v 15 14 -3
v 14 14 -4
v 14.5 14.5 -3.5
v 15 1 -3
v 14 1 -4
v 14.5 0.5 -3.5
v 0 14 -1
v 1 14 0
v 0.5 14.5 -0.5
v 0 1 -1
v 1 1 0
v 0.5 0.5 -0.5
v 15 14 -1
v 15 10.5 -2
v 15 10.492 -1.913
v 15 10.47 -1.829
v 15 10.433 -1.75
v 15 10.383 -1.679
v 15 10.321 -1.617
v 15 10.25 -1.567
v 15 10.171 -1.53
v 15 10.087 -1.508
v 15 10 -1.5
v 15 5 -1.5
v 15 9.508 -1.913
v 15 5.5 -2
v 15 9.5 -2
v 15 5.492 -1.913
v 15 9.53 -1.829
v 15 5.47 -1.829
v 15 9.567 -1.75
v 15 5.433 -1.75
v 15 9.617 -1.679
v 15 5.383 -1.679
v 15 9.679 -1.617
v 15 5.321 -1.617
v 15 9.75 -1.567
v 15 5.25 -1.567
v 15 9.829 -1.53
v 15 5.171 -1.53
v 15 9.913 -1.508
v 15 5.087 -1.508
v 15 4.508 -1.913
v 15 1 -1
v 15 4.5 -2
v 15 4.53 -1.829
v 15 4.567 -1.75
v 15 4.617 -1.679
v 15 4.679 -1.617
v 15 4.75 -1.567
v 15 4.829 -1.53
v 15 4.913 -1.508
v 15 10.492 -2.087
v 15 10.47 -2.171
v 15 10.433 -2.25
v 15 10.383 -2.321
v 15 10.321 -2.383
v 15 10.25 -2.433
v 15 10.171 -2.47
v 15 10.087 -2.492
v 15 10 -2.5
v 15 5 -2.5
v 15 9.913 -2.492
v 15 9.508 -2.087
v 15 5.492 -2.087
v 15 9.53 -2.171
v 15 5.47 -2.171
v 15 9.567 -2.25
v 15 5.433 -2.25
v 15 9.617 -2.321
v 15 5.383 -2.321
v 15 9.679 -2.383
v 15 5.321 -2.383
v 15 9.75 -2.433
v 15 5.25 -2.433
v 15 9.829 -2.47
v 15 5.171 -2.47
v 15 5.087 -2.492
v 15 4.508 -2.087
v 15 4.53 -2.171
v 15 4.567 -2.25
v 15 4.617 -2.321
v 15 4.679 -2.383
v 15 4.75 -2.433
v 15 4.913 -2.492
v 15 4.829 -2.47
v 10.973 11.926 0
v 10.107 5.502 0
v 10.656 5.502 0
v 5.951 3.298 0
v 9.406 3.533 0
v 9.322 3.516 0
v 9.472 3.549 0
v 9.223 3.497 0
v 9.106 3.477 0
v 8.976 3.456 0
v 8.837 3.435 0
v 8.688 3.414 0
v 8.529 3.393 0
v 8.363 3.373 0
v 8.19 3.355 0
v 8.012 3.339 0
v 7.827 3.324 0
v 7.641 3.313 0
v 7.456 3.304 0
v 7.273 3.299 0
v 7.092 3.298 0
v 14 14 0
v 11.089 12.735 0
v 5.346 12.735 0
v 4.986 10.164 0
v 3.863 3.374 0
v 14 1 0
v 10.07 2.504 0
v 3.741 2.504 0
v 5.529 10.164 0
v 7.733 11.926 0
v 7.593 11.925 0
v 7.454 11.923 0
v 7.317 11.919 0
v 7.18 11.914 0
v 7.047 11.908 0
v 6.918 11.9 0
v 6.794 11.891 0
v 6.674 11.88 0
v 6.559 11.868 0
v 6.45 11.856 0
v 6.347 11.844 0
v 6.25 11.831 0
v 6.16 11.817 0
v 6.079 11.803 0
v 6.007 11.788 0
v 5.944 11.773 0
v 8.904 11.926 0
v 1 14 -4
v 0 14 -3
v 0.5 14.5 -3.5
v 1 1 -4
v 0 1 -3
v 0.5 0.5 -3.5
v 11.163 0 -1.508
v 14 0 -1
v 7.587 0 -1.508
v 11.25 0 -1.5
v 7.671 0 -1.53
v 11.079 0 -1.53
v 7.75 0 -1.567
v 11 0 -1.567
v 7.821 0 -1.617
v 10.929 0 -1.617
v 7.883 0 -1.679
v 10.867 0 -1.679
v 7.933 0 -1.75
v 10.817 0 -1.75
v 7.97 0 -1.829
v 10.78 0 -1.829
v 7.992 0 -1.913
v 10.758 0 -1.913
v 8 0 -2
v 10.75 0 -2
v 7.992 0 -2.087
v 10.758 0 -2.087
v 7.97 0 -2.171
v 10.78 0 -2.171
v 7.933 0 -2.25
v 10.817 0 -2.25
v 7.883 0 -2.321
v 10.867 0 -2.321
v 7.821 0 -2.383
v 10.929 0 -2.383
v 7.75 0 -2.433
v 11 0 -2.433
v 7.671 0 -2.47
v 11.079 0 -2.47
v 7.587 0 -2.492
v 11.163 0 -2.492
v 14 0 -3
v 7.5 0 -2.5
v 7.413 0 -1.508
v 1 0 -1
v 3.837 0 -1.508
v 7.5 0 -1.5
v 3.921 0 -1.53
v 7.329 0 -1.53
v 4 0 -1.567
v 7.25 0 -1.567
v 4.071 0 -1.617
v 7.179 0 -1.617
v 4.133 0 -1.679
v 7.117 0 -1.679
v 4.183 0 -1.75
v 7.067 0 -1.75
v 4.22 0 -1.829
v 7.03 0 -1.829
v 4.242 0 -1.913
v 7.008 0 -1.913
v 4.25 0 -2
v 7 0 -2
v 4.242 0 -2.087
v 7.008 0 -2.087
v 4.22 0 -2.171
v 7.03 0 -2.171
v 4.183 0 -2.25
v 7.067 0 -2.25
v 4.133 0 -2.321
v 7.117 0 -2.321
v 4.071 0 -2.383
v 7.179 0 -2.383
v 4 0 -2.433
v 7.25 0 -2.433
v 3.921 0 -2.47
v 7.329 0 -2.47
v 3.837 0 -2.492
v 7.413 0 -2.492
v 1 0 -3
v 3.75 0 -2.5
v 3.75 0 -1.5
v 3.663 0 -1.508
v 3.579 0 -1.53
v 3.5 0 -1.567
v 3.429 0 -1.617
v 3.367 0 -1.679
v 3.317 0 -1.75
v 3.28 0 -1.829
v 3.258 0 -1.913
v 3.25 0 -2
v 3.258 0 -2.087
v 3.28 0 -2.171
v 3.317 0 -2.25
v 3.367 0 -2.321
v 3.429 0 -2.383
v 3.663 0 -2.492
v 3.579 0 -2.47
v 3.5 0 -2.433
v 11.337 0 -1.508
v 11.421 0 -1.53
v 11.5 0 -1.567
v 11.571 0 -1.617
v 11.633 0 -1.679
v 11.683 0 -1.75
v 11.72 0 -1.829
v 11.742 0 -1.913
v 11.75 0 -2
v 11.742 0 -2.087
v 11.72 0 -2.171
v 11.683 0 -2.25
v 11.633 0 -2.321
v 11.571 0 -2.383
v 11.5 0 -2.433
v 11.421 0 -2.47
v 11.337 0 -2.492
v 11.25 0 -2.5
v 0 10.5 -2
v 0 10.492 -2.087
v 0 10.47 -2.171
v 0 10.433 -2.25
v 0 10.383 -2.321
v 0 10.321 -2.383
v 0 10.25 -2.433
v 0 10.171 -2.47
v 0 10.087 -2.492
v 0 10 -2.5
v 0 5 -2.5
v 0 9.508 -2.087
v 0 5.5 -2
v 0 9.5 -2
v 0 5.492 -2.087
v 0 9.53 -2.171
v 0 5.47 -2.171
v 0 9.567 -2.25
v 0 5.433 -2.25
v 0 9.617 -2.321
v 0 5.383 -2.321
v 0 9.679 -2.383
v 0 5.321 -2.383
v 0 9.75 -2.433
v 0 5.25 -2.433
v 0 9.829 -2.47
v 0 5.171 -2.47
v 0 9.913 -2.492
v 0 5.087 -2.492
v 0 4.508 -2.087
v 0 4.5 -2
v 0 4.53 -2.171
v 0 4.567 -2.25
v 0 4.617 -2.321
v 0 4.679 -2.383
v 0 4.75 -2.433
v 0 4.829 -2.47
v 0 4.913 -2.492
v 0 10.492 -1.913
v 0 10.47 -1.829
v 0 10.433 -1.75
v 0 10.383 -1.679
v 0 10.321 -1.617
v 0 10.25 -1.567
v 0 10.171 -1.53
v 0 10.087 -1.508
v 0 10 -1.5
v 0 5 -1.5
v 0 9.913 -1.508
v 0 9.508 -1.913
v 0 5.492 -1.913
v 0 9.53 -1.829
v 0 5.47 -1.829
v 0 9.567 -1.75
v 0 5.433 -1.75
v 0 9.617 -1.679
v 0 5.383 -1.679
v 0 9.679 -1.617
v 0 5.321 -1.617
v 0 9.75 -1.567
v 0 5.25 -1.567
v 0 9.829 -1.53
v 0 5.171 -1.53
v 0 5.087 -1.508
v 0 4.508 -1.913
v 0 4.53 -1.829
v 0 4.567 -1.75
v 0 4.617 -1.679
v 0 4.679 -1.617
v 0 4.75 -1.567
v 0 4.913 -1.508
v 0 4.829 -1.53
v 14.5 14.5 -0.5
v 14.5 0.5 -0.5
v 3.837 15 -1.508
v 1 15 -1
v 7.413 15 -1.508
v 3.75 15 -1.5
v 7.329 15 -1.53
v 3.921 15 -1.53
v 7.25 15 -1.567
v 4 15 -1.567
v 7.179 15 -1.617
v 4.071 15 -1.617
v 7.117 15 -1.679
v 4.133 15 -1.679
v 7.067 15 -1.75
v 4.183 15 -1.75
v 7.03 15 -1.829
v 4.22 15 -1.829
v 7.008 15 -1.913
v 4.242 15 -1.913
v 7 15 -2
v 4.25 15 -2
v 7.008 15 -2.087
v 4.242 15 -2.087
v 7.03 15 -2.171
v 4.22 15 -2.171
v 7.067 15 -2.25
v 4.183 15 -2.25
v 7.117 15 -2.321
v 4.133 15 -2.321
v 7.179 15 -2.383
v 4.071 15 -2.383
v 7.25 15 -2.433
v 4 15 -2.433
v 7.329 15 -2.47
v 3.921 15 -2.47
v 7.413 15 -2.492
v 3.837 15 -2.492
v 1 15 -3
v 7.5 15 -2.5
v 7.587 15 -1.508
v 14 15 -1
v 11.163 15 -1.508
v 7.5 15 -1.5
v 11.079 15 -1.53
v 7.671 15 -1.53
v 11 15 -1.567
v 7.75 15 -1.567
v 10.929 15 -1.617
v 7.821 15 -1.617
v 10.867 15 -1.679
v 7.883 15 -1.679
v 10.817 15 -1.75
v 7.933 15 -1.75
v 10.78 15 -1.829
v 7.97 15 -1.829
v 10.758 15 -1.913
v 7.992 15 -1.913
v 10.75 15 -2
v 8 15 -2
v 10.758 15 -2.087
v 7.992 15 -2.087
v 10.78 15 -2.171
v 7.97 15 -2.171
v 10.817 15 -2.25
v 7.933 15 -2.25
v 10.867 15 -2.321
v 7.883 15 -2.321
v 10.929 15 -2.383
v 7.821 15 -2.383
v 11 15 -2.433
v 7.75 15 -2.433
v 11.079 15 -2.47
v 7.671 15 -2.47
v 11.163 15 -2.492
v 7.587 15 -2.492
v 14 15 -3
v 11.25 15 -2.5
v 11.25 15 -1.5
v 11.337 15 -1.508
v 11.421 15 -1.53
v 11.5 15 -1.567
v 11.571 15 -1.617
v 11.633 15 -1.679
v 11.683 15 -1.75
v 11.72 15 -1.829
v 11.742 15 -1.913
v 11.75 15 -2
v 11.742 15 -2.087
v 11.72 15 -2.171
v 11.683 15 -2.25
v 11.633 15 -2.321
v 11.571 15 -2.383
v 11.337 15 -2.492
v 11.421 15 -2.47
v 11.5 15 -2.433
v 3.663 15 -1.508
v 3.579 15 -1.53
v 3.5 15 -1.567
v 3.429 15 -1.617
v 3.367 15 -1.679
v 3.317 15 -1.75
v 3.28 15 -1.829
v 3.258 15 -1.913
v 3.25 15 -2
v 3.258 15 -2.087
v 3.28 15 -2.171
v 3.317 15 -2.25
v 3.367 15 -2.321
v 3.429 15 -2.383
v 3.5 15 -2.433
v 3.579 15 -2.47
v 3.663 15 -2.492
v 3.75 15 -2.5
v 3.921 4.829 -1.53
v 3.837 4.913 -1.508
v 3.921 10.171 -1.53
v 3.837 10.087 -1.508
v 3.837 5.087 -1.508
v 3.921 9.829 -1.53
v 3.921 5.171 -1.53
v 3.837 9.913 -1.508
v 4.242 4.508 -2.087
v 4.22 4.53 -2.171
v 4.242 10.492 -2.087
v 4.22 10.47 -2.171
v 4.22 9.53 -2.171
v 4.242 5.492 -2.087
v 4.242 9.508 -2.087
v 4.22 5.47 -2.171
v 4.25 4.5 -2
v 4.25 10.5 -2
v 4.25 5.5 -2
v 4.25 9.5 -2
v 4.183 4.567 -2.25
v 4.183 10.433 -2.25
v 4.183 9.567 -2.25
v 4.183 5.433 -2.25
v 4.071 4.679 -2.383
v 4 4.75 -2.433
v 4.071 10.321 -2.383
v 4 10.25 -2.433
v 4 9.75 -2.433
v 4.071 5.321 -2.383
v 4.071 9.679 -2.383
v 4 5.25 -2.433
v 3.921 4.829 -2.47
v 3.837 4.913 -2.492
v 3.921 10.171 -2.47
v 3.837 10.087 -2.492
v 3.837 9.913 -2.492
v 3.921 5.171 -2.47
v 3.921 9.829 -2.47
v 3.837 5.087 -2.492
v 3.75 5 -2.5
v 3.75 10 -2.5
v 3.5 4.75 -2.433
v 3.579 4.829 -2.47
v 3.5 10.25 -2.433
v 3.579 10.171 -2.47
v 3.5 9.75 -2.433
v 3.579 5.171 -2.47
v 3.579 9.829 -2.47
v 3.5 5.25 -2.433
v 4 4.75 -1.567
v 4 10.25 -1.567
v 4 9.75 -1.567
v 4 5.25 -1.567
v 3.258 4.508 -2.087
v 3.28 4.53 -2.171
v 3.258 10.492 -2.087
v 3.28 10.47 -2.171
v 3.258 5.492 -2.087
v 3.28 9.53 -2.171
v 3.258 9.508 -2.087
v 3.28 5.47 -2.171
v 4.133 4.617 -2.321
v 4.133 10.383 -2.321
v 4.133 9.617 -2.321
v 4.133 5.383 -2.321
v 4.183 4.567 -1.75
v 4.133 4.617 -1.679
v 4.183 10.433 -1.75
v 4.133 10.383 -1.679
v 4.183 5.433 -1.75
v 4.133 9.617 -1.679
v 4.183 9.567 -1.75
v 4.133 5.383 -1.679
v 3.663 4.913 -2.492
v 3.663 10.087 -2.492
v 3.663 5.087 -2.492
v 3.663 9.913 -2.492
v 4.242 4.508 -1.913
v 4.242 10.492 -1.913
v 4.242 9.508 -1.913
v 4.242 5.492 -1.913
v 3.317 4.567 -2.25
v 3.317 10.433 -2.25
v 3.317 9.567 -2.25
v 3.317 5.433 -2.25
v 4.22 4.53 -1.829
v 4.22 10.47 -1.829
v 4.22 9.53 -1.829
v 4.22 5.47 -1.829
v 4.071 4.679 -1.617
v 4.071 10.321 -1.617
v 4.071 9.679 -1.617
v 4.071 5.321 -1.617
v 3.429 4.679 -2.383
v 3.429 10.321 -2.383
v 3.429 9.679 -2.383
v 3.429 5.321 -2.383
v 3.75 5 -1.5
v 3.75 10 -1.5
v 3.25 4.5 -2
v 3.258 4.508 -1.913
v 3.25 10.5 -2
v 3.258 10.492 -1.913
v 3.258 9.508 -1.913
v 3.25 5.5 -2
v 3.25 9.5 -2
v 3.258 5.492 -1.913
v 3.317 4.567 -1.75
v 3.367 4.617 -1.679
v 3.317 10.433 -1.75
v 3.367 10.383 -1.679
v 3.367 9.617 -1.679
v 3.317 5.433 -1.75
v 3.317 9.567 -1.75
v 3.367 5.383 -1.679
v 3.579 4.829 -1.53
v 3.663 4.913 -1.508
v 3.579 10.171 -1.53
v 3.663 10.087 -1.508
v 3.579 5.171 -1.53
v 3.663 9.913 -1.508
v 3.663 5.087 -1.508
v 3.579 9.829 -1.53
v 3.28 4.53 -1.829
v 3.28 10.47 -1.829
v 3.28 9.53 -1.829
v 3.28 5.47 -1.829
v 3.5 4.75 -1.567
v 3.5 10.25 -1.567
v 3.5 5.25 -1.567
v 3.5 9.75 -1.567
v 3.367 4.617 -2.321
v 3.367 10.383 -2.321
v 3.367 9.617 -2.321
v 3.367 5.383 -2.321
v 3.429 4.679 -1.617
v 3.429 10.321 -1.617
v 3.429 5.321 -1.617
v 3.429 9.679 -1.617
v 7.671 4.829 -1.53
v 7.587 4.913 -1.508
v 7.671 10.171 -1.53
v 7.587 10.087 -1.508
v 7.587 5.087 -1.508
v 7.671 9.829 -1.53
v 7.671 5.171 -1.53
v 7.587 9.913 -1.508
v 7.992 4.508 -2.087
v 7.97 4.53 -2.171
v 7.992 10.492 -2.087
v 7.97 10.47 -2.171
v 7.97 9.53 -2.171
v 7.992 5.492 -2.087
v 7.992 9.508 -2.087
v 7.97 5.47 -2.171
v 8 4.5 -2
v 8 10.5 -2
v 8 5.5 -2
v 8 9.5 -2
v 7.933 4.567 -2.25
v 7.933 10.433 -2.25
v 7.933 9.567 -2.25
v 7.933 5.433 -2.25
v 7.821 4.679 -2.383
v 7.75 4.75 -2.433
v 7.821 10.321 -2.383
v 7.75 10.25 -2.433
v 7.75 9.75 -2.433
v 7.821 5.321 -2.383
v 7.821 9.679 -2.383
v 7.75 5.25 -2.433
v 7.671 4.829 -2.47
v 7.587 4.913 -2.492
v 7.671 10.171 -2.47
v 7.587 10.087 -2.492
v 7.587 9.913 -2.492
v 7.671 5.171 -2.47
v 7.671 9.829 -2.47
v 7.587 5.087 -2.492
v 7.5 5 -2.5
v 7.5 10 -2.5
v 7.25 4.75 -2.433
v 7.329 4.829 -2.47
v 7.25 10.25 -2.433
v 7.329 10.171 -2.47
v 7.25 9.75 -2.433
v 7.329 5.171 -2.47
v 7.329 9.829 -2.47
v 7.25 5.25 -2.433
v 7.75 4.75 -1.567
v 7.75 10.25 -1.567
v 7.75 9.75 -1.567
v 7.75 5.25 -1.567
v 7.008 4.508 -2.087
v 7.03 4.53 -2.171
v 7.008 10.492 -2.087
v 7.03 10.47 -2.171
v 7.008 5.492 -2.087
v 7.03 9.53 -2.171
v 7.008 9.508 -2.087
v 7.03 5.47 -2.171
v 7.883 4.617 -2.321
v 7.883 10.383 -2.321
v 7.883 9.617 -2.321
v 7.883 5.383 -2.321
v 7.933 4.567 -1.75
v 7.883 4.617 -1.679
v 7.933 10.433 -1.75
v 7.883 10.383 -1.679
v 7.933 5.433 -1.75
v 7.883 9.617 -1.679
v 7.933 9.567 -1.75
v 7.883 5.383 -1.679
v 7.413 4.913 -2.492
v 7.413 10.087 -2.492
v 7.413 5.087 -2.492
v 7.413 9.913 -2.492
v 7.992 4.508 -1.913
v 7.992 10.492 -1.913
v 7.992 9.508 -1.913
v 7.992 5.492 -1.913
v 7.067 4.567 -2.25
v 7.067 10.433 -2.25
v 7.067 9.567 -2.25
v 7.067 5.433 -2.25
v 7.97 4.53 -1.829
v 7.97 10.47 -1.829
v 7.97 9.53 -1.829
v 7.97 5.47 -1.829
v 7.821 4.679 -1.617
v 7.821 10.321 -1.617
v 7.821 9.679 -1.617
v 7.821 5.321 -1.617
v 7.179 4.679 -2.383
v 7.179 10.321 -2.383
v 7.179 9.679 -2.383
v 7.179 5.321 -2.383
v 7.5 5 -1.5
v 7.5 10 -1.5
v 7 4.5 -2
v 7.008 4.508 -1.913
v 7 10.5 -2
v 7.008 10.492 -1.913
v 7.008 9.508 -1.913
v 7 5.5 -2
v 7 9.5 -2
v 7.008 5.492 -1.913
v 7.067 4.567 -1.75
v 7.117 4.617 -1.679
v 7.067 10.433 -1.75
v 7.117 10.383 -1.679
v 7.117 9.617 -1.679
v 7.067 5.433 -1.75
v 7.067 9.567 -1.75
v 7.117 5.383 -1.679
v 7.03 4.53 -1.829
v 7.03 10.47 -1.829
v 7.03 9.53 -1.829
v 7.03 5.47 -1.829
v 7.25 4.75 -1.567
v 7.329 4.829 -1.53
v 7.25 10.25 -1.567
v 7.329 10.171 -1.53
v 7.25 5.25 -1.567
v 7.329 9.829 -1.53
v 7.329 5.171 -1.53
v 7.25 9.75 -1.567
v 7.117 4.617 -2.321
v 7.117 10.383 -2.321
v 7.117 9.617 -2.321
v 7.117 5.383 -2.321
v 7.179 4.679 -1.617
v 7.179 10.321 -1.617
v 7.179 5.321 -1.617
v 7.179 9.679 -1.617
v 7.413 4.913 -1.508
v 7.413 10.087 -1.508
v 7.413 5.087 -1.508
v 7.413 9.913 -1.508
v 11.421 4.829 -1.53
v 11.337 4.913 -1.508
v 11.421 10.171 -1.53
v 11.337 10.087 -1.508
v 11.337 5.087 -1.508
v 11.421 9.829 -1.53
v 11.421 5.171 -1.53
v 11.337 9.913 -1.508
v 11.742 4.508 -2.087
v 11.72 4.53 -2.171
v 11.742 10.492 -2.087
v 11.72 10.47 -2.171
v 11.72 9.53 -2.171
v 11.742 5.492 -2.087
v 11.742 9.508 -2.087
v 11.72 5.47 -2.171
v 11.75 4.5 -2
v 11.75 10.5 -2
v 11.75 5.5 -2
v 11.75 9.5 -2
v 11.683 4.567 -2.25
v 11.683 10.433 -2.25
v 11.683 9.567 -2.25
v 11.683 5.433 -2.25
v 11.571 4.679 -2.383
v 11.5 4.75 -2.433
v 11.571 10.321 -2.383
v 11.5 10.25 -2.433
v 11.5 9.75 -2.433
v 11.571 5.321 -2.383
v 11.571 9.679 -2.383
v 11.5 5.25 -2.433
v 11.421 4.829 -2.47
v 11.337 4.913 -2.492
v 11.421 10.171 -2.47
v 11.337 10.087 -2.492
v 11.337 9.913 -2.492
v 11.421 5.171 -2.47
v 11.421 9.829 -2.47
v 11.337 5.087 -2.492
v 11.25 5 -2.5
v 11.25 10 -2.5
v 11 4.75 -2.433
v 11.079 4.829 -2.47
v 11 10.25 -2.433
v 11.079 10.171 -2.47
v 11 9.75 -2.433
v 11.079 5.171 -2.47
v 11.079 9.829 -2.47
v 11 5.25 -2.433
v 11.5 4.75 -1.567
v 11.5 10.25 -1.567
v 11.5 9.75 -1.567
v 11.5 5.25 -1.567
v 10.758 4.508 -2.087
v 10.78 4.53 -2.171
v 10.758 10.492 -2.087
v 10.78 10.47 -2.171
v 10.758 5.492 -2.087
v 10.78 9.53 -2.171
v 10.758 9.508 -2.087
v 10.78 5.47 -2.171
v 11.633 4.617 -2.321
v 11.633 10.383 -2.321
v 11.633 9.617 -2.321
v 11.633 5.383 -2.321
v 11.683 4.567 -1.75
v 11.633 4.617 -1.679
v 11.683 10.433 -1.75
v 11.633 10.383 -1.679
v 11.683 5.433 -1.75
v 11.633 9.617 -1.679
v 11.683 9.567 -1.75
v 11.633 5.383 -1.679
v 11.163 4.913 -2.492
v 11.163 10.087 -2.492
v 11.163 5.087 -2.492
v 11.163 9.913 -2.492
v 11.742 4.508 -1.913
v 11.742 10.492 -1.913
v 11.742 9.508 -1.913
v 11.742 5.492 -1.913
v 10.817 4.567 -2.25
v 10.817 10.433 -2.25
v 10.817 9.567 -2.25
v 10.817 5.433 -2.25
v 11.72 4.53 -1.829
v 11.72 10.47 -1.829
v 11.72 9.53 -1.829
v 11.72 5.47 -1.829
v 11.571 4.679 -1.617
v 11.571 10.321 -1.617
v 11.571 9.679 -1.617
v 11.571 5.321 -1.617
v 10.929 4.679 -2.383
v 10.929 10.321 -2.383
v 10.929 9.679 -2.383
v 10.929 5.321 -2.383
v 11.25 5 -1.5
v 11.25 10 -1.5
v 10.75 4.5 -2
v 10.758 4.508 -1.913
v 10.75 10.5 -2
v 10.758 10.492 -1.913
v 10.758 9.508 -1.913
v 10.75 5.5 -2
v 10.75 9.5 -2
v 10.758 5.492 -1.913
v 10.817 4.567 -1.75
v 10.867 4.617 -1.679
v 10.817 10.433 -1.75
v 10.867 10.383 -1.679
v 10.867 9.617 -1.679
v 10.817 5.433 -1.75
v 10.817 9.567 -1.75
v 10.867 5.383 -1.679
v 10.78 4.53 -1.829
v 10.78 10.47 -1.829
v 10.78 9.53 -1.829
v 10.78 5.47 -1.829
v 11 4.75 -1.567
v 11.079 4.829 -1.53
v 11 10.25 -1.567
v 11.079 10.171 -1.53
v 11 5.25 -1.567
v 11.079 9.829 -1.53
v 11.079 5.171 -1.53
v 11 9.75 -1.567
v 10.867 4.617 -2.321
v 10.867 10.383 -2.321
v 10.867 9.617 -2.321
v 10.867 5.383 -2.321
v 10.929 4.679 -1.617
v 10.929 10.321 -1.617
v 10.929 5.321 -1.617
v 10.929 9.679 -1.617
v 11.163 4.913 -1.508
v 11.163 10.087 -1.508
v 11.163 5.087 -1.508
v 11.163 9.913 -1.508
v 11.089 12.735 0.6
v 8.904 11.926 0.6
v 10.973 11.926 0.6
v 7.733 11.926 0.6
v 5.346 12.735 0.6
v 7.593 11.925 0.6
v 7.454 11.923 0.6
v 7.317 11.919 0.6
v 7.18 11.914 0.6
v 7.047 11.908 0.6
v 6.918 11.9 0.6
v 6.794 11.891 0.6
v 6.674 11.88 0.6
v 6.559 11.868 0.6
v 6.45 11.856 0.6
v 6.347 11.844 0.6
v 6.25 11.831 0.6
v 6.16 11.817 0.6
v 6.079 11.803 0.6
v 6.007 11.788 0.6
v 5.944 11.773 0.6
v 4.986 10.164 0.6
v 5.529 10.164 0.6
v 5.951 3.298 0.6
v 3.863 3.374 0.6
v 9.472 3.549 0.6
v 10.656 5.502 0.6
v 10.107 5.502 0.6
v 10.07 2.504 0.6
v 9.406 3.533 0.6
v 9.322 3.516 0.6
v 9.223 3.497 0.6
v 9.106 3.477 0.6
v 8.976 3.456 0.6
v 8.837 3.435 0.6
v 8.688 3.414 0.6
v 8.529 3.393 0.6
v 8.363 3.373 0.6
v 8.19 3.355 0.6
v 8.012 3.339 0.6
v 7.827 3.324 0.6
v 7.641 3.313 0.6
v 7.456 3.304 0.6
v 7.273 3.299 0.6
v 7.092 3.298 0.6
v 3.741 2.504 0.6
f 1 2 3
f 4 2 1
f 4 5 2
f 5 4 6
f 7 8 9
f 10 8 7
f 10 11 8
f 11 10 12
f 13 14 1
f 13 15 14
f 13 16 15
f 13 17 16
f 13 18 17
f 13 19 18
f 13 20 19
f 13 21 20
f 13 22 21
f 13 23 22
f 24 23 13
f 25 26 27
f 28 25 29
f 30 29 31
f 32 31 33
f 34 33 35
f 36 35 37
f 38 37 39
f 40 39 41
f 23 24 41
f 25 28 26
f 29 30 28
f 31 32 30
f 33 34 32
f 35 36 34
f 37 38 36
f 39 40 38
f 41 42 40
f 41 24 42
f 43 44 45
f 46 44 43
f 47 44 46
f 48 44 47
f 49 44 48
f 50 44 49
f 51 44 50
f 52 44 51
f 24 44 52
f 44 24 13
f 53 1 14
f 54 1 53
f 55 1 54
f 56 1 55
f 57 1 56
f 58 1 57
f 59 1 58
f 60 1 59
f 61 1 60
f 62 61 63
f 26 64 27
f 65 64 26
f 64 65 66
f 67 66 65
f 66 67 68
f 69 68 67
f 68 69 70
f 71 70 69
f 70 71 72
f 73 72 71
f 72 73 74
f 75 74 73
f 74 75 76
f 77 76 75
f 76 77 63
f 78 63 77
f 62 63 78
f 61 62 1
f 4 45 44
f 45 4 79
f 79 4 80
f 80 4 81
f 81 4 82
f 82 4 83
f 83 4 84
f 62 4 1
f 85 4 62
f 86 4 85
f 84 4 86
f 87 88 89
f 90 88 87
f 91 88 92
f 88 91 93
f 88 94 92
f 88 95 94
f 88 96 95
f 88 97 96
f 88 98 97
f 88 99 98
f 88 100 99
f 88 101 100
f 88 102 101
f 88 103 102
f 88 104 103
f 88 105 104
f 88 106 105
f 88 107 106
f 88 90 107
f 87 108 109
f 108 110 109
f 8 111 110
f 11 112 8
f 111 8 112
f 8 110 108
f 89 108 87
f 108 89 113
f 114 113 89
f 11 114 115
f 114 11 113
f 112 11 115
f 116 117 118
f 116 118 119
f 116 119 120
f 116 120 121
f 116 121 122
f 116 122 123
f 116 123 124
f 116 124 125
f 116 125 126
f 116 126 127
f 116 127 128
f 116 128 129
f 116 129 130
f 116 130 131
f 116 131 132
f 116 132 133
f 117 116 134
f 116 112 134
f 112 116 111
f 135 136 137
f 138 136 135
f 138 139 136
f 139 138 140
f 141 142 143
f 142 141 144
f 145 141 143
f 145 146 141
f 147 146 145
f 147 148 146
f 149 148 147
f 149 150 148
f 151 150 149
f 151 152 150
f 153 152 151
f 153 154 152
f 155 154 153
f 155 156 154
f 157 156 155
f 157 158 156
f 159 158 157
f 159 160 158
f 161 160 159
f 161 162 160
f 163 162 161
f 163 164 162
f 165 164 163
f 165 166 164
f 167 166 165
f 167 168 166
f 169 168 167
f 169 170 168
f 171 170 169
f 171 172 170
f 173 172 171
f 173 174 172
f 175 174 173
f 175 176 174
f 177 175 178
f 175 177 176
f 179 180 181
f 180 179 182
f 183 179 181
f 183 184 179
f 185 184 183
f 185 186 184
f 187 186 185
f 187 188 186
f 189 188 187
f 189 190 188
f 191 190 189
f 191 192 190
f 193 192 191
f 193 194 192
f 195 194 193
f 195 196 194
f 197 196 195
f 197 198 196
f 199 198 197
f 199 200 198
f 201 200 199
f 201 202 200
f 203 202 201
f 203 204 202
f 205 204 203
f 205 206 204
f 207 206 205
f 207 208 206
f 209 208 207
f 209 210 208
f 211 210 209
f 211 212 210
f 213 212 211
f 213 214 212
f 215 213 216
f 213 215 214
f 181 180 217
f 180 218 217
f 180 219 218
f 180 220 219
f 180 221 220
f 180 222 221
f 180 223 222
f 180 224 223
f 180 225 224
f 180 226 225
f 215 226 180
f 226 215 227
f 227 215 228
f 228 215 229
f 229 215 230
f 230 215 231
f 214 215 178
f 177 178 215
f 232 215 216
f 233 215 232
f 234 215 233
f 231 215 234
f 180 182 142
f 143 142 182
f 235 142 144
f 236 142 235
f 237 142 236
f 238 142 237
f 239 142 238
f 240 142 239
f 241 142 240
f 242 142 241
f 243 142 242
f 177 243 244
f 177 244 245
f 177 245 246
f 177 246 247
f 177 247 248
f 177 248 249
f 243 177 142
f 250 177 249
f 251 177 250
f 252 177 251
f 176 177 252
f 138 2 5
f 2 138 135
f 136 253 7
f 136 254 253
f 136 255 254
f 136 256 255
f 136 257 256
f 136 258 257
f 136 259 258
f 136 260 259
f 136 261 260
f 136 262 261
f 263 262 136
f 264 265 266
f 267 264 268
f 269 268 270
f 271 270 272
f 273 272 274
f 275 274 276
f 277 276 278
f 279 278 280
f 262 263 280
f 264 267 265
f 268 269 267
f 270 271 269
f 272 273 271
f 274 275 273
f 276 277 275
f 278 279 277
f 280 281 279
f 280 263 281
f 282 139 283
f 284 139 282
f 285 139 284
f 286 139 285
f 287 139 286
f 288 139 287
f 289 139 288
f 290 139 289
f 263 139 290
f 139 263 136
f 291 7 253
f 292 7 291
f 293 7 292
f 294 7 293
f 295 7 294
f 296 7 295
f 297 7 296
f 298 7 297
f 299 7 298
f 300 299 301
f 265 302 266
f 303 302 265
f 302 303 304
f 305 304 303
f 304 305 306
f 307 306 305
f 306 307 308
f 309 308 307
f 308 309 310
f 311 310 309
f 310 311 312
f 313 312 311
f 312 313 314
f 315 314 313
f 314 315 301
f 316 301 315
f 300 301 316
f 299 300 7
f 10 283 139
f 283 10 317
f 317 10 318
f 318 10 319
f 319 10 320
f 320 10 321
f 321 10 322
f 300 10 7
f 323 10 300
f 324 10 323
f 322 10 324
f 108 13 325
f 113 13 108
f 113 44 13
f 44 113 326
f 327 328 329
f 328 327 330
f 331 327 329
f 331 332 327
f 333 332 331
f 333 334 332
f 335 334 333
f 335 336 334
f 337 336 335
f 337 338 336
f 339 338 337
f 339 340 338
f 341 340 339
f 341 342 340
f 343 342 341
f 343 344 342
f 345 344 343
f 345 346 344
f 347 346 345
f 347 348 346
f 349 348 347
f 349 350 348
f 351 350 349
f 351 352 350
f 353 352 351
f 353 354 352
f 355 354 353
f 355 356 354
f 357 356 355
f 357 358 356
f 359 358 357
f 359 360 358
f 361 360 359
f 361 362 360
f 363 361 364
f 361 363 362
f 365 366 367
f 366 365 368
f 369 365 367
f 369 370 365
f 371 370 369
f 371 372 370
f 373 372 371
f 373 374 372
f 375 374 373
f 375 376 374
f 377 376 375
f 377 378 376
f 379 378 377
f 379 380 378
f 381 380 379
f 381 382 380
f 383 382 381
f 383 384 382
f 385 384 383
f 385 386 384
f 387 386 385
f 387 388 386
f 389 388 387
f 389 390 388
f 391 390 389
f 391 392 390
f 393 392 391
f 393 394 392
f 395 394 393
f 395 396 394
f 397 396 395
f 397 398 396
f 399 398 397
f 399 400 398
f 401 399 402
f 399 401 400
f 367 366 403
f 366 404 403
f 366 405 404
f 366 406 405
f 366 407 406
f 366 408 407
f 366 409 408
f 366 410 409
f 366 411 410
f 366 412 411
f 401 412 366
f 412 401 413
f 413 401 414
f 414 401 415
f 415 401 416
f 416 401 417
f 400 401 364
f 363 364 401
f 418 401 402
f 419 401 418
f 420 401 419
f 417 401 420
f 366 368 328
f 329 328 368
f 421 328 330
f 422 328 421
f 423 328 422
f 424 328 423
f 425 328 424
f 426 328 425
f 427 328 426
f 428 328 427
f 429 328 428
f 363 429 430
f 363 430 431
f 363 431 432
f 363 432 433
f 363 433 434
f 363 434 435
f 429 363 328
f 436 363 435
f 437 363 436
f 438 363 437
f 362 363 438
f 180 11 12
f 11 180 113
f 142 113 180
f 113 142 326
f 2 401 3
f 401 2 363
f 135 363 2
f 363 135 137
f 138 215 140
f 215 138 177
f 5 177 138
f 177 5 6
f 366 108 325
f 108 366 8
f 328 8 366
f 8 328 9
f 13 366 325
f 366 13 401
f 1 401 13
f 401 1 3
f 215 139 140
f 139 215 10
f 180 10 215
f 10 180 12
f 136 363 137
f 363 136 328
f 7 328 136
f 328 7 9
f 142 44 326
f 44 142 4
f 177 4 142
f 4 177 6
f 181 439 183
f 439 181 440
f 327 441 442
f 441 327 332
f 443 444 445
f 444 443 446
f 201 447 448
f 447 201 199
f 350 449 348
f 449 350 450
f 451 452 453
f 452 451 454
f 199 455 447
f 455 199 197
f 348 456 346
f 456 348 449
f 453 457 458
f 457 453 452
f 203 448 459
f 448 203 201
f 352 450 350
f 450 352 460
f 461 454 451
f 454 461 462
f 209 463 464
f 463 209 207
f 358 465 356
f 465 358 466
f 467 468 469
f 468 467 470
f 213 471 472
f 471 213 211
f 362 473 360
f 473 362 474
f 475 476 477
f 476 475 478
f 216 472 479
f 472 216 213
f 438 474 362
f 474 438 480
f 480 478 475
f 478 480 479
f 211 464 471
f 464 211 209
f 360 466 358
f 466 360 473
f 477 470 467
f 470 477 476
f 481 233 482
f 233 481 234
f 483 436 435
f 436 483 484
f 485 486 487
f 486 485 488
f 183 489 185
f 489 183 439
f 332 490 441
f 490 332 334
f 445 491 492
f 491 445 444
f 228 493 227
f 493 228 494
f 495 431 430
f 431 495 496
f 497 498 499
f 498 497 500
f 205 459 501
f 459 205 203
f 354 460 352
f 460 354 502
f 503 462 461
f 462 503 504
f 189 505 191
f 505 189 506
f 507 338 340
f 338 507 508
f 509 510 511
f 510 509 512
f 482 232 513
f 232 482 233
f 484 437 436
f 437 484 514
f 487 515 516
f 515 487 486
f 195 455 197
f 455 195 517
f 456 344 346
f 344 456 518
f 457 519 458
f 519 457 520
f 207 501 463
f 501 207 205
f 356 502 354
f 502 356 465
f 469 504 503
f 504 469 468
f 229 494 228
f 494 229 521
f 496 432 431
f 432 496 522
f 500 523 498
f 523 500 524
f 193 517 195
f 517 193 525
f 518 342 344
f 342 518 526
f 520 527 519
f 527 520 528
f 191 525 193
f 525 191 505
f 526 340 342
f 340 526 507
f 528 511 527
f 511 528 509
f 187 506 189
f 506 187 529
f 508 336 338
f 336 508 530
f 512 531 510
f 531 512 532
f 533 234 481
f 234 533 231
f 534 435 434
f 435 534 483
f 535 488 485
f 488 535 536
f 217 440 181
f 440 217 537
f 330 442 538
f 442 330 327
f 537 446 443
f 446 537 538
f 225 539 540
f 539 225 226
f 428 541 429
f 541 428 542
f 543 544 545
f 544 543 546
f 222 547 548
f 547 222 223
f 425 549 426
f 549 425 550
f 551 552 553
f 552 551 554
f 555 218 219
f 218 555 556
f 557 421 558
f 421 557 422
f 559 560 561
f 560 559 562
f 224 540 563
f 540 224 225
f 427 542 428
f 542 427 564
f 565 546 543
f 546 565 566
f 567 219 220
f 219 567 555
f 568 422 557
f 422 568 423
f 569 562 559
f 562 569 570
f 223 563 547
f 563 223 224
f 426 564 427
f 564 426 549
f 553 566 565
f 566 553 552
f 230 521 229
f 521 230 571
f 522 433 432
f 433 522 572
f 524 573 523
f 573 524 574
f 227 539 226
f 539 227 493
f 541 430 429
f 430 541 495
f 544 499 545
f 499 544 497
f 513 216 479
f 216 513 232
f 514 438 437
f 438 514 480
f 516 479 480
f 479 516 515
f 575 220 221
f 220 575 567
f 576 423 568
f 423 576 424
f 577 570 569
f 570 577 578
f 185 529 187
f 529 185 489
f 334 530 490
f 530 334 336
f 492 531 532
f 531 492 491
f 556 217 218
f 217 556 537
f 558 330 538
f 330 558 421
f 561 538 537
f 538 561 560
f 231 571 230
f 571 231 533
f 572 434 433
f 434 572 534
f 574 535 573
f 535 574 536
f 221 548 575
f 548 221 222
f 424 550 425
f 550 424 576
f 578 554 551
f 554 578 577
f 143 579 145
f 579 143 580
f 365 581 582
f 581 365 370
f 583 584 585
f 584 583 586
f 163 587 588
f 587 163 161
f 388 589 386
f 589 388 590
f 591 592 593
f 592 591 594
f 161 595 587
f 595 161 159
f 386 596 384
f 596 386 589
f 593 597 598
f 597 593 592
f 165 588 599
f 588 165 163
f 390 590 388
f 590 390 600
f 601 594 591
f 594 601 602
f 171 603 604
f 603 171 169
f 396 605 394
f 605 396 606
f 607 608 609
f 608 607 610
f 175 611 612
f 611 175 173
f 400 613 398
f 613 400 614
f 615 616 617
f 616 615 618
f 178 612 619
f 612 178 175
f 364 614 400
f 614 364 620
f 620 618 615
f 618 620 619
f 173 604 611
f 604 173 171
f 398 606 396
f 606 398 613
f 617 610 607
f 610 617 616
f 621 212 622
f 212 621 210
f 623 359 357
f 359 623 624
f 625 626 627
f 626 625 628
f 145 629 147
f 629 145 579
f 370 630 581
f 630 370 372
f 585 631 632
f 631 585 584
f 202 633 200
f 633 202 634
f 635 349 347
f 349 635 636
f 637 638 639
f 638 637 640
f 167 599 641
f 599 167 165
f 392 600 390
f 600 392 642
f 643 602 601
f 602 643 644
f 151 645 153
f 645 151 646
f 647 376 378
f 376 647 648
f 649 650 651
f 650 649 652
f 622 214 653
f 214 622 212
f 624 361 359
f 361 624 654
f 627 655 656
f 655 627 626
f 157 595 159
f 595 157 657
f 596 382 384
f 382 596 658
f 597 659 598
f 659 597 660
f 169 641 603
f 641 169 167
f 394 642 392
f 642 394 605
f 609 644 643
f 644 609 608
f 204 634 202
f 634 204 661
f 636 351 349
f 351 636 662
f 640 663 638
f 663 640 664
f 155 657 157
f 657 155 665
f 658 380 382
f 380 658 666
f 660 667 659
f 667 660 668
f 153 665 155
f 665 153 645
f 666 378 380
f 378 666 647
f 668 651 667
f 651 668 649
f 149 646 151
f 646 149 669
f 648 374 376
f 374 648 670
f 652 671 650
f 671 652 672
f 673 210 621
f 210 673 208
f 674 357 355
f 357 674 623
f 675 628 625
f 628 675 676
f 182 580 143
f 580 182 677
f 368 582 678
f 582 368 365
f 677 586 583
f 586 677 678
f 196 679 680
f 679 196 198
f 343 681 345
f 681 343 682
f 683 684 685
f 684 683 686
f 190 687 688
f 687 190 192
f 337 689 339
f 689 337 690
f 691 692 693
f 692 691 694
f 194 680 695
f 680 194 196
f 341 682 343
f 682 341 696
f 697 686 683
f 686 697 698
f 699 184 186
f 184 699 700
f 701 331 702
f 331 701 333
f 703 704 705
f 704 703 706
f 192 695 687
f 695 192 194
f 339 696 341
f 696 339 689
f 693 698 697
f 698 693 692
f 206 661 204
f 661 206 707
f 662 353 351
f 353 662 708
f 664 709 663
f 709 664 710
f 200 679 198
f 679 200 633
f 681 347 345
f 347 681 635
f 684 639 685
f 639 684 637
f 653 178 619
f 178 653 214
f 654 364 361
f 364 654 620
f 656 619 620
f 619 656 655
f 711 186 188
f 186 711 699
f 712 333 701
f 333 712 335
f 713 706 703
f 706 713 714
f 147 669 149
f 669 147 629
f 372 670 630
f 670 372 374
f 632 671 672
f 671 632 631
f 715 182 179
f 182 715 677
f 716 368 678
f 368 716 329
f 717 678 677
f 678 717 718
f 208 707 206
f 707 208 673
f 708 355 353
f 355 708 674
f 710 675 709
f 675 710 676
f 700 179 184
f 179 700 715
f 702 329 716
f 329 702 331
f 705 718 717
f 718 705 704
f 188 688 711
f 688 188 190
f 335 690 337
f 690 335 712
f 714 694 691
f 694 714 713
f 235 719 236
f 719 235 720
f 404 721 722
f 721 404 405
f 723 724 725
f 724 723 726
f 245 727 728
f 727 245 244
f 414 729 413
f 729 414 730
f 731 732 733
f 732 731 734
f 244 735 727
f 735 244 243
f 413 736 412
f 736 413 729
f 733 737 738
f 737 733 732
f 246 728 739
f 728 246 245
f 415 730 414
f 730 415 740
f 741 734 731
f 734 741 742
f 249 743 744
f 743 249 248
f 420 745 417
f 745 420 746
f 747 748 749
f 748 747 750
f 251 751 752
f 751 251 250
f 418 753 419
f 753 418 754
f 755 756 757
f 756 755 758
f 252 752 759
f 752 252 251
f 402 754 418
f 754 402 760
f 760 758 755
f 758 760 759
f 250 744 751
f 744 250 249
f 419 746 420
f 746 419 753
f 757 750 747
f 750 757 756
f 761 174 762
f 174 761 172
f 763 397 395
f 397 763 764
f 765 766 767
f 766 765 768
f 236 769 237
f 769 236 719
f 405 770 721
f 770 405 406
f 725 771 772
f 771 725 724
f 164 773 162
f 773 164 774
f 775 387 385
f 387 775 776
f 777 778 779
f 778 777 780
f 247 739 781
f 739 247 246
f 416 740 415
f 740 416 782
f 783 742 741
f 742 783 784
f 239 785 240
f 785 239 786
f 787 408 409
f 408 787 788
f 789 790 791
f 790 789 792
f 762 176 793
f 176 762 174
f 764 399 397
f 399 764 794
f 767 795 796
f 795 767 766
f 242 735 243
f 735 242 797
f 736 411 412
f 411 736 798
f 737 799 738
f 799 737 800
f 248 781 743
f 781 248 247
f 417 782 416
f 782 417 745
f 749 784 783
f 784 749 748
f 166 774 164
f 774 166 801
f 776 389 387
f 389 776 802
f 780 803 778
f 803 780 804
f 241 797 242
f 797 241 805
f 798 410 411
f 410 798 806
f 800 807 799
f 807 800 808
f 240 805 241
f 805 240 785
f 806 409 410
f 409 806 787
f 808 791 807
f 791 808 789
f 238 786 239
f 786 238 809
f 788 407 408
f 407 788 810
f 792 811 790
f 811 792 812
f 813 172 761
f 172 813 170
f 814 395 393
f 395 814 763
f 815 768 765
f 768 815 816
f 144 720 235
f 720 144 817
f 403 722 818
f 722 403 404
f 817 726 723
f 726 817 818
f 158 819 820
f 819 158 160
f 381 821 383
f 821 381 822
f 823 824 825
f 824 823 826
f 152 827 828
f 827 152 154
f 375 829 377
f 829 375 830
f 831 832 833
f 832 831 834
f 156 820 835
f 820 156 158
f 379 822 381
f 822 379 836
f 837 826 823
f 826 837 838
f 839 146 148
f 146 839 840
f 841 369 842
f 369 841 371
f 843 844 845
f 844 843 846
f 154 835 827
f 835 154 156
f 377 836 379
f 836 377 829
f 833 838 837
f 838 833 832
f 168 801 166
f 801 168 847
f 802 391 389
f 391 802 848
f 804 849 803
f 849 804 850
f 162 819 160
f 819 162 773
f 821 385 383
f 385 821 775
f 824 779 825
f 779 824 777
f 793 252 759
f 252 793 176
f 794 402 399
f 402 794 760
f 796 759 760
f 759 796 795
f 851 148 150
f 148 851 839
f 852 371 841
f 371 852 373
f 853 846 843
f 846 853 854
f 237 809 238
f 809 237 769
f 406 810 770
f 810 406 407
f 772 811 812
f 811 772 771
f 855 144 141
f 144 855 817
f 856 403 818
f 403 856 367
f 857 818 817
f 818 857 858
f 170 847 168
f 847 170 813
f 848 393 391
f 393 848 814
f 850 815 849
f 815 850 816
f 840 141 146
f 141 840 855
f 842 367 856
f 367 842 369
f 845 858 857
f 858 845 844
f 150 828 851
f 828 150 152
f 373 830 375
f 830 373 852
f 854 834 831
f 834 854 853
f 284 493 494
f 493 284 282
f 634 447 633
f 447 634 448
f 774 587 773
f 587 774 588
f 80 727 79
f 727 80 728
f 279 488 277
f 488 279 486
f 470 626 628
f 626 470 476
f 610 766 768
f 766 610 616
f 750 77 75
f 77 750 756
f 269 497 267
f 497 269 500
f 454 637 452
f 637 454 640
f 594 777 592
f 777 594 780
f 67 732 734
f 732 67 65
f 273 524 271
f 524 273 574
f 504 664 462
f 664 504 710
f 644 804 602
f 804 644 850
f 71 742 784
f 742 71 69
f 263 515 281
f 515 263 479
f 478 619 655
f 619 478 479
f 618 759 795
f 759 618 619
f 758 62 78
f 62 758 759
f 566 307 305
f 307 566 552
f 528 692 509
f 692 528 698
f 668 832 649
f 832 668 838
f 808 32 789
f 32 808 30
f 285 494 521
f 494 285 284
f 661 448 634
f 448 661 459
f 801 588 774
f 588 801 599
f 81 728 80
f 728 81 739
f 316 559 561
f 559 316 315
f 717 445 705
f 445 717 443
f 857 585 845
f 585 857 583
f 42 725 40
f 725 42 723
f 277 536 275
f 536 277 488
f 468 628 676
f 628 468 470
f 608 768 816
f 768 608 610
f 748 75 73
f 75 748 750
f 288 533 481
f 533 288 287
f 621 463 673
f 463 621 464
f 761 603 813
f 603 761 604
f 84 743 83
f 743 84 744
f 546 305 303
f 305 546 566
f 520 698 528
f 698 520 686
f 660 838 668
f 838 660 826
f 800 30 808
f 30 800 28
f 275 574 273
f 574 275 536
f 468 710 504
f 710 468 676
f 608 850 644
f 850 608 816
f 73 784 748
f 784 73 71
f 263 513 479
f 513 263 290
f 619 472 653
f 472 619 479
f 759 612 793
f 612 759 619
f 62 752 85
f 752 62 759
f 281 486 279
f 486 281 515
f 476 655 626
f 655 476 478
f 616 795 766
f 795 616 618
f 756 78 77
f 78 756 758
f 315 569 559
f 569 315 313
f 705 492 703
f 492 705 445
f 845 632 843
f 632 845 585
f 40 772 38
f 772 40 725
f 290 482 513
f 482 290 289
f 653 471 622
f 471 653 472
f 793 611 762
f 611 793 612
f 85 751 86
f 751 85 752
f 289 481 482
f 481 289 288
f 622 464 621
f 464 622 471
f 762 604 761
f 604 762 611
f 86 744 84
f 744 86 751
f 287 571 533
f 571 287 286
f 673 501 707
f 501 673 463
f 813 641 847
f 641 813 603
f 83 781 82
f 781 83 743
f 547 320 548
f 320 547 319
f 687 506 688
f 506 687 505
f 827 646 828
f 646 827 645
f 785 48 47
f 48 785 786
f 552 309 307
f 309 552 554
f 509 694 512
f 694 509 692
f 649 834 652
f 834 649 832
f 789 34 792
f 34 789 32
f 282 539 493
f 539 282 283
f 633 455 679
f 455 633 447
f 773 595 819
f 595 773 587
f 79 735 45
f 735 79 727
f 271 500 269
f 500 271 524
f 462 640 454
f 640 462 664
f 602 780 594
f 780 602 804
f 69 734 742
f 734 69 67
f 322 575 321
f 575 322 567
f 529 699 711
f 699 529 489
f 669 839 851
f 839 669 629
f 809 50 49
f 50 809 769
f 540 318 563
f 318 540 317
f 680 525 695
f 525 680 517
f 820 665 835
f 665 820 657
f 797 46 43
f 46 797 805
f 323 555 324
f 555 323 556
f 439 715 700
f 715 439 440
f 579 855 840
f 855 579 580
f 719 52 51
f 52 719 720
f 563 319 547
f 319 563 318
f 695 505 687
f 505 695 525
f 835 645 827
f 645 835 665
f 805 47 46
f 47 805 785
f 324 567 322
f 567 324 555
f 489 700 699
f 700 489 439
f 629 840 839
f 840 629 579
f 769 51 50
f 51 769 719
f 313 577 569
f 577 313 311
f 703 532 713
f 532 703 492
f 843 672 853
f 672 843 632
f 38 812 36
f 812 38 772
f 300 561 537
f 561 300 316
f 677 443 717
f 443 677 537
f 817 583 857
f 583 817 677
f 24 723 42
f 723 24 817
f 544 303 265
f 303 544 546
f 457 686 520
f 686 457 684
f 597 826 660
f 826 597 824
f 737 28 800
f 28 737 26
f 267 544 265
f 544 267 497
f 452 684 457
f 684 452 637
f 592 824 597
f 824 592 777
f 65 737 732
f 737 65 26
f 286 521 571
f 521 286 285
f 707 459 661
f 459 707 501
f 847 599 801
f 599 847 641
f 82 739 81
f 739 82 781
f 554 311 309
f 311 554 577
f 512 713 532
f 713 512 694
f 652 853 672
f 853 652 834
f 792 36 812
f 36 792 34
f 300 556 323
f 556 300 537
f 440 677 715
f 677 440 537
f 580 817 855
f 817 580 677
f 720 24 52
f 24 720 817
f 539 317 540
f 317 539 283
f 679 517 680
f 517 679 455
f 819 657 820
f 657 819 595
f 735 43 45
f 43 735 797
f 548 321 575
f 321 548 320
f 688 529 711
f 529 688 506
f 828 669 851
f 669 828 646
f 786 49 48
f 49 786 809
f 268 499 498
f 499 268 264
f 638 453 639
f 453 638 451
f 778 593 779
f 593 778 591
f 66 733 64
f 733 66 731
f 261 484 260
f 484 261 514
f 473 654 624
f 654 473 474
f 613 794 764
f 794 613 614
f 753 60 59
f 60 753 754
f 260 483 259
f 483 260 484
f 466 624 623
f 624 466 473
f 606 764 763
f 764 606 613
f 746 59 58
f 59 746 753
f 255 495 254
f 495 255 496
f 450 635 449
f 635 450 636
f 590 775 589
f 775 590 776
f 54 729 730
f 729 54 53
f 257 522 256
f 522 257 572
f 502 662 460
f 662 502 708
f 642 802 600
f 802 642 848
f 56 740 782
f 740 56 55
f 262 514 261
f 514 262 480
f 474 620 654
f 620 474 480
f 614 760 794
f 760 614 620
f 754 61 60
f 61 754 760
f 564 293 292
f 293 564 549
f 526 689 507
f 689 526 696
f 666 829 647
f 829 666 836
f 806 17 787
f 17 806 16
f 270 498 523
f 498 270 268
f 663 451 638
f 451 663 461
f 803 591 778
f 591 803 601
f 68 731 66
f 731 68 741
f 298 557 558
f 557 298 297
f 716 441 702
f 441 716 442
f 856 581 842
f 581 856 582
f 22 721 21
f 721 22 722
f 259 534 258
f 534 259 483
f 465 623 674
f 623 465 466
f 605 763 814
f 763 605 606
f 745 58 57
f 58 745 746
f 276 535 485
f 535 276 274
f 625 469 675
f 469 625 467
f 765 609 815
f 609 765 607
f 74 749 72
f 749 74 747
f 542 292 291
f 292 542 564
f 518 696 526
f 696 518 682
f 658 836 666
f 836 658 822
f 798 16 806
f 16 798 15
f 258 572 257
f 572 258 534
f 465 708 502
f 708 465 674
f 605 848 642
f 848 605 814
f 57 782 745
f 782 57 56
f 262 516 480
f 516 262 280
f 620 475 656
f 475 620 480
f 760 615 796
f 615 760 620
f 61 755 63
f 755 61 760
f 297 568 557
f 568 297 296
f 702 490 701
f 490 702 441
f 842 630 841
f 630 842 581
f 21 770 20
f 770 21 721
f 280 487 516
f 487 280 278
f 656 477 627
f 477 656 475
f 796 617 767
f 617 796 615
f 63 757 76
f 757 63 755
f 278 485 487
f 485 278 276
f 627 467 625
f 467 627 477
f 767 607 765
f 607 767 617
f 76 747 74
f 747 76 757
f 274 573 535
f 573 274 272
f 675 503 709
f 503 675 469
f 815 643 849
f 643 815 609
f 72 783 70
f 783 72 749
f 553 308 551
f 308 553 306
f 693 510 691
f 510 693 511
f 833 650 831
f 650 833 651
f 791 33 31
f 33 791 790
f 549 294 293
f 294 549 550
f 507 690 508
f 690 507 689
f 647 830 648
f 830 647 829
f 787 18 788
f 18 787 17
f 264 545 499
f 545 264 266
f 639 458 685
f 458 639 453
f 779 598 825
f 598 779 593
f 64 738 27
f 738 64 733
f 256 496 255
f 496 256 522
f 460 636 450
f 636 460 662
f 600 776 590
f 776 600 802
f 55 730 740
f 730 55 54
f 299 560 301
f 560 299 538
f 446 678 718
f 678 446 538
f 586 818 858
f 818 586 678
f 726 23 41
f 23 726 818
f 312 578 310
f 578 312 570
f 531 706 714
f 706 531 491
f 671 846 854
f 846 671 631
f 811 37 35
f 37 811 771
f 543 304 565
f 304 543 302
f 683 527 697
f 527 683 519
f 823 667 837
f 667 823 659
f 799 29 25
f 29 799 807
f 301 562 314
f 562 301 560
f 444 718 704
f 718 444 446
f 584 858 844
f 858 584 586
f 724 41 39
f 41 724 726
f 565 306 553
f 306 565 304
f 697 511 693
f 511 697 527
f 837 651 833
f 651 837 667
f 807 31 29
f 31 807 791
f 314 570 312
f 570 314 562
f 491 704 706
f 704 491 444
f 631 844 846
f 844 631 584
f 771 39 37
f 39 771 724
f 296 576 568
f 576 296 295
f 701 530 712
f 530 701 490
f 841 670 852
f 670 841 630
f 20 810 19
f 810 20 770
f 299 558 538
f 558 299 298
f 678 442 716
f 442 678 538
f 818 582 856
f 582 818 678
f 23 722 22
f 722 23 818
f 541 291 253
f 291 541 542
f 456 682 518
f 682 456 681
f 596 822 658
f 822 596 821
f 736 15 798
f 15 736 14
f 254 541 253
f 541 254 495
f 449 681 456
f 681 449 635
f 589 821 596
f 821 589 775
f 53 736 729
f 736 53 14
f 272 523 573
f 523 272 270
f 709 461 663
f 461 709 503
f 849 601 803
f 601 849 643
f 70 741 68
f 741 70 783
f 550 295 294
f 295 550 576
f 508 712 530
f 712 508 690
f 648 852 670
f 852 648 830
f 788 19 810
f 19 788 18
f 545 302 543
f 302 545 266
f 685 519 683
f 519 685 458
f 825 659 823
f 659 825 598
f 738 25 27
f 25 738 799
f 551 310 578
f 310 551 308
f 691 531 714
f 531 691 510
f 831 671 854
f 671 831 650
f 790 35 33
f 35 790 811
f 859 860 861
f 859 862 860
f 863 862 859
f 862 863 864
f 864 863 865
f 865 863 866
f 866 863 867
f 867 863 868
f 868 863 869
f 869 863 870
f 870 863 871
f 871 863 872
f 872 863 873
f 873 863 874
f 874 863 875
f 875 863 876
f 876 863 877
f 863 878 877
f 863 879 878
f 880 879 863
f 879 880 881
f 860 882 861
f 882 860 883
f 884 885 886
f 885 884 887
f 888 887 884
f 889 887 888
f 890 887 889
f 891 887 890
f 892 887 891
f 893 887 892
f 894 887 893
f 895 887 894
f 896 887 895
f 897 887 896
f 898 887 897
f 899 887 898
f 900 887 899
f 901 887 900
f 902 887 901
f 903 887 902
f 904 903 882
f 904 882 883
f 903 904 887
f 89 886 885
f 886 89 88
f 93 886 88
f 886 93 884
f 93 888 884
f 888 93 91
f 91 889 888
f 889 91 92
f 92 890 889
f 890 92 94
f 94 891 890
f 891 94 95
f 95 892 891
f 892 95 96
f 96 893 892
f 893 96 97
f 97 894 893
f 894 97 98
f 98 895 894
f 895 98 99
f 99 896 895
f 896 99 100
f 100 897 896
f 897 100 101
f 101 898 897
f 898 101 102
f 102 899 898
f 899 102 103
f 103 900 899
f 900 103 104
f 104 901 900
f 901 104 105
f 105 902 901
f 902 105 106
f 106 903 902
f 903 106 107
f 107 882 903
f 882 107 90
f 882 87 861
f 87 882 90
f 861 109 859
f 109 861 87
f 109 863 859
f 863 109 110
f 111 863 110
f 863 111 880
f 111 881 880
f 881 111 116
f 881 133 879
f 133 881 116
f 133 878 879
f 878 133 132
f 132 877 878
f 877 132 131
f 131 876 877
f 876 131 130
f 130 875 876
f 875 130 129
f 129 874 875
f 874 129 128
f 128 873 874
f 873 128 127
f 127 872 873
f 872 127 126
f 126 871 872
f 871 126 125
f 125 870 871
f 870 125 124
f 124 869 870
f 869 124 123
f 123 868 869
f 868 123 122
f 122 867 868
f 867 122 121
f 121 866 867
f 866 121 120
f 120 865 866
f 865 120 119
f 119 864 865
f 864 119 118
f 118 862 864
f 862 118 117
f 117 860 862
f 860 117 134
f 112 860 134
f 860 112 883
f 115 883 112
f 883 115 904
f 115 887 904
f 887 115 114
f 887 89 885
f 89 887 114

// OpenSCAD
// Customizable Letter Tiles
// Will Schleter (wschleter@gmail.com)
//  Dec 14, 2016 - original version
//  Oct 17, 2018 - added option to cut out the design

/* [Extrusion Settings] */
// this is how the image is added to the tile
cut_or_add = "add"; // [cut,add]
// extrusion height (mm)
e = 0.6;

/* [Text Settings] */
// Tile text
txt = "Z";
// Text size as percentage of tile height
ts = 0.75;
// Text aspect ratio - w/h
ar = 0.8;
// Text font
fn = "Serif"; // [Sans, Mono, Sans Narrow, Serif]
// Text style
tst = "bold italic"; //[:Regular,bold:Bold,italic:Italic,bold italic:Bold/Italic]

/* [Tile Settings] */
// Tile height (mm)
th = 15;
// Tile width (mm, use 0 to autosize)
tw = 15;
// Tile thickness (mm)
tt = 4;
// Tile separator - character in text used to split, leave empty to split on every character
sep = "";
// Tile width multiplier (use to adjust width of autosized tiles)
twm = 1;

/* [Hole Settings] */
// Hole diameter (mm)
d = 1;
// Number of side holes
ns = 2; // [0,1,2,3]
// Number of top holes
nt = 3; // [0,1,2,3]

/* [Chamfer Settings] */
// Top chamfer size (mm)
cht = 1;
// Side chamfer size (mm)
chs = 1;
// Corner chamfer size (mm)
chc = 1;
// Chamfers on bottom
chb = 1; // [0:No, 1:Yes]

/* [Layout Settings] */
// Number of tiles per row
tpr = 4;
// Tile spacing (mm)
sp = 2;

/* [Image Tile] */
// Use image (if set to yes the text settings will be ignored and a single tile generated)
useimg = 0; // [0:No, 1:Yes]
// Image height as percentage of tile height
ih = 0.75;
// Image width as percentage of tile width
iw = 0.75;
// Upload an 100x100 image that will be used
image_file = "dog.png"; // [image_surface:100x100]


// split text into tiles
txt2 = useimg==1 ? " " : txt;
list = len(sep)==0 ? str2vec(txt2) : split(txt2,sep);

// loop through each tile
h=th;
w=tw;
t=tt;
tilesperrow = (tw==0) ? 1 : tpr; // force tpr to be 1 if autowidth
for (j=[0:len(list)-1]) {
  // make and position each tile
  w = (tw>0) ? tw : (len(list[j]) + 0.5)*th*ts*ar*twm; 
  row = floor(j/tilesperrow);
  yy = -row*(h+sp);
  xx = (j-row*tilesperrow)*(w+sp);
  translate([xx,yy,0]) makeTile(list[j],w);
}

module makeBlankTile(w) {
    difference() {
      makeBlock(w);
      if (nt>0) { makeTopHoles(w); }
      if (ns>0) { makeSideHoles(w); }
      }
}
  
module makeTile(letter,w) {
    if (cut_or_add=="add") {
        union() {
        makeBlankTile(w);
        if (useimg) makeImage(w);
        else makeText(letter,w);
        }
    } else {
        difference() {
        makeBlankTile(w);
        if (useimg) makeImage(w);
        else makeText(letter,w);
        }
    }
}

module makeBlock(w) {
// three intersecting polygon extrusions are used to support chamfers on all edges
  intersection() {

// this is the y (height) polygon
  rotate([-90,0,0])
  linear_extrude(h)
  polygon([[chs,0],[w-chs,0],[w,chs],[w,t-chs*chb],[w-chs*chb,t],[chs*chb,t],[0,t-chs*chb],[0,chs]]);

 // this is the x (width) polygon
  translate([w,0,0])
  rotate([-90,0,90])
  linear_extrude(w)
  polygon([[cht,0],[h-cht,0],[h,cht],[h,t-cht*chb],[h-cht*chb,t],[cht*chb,t],[0,t-cht*chb],[0,cht]]);

 // this is the z (thickness) polygon
  translate([0,0,-t])
  rotate([0,0,0])
  linear_extrude(t)
  polygon([[chc,0],[w-chc,0],[w,chc],[w,h-chc],[w-chc,h],[chc,h],[0,h-chc],[0,chc]]);

}
}

module makeTopHoles(w) {
  s=w/(nt+1);
  for (i=[0:nt-1]) {
    translate([i*s+s,h/2,-t/2])
    rotate([-90,0,0])
    cylinder(h=h*2, d=d, center=true,$fn=36);
  }
}

module makeSideHoles(w) {
  s=h/(ns+1);
  for (i=[0:ns-1]) {
    translate([w/2,i*s+s,-t/2])
    rotate([0,90,0])
    cylinder(h=w*2, d=d, center=true,$fn=36);
  }
}
 
module makeText(letter,w) {
//text on top
  translate([w/2,h/2,-e])
  linear_extrude(height = e*2) 
  scale([ar,1,1])
  text(text = letter,
            font = str("Liberation ",fn,":style=",tst),
            size = h*ts,
            valign = "center",
            halign = "center");
  
}

module makeImage(w) {
translate([w*(1-iw)/2,h*(1-iw)/2,e])
scale([w*iw/(imgW-1),h*ih/(imgH-1),2*e])
surfaceNoBase(file=image_file,invert=true);
}

module surfaceNoBase(convexity=10,invert=false) {
    // when an XxY resolution image is loaded via the surface command,
    // it becomes an (X-1)x(Y-1)x101 solid image, with a rectangular base.
    // to further complicate things, if the invert option is used,
    // the resulting solid is shifted
    // this module removes the base and corrects for the shifting
    // note: centering isn't supported because I could not find a way of obtaining the image resolution
    
    translate([0,0,-1])  // shift back down to z=0
    intersection() {
        translate([0,0,invert ? 100:0]) // correct for shifting if inverted
        surface(file = file, invert=invert, convexity=convexity); // make the surface
        translate([0,0,1]) cube([1000,1000,100]); // this cube cuts of the bottom 2 units
    }
}
///////////////////////////////////////////////////////////////////
// functions below from http://www.thingiverse.com/thing:1237203 //
///////////////////////////////////////////////////////////////////

/**** split ****

[vect] split(`str`, `[sep]`)
Returns a vector of substrings by cutting the string `str` each time where `sep` appears.
See also: strcat(), str2vec()

Arguments:
- [str] `str`: The original string.
- [char] `sep`: The separator who cuts the string (" " by default).

Usage:
str = "OpenScad is a free CAD software.";
echo(split(str)); // ["OpenScad", "is", "a", "free", "CAD", "software."]
echo(split(str)[3]); // "free"
echo(split("foo;bar;baz", ";")); // ["foo", "bar", "baz"]
*/
function split(str, sep=" ", i=0, word="", v=[]) =
	i == len(str) ? concat(v, word) :
	str[i] == sep ? split(str, sep, i+1, "", concat(v, word)) :
	split(str, sep, i+1, str(word, str[i]), v);

/**** str2vec ****

[vect] str2vec(`str`)
Returns a vector of chars, corresponding to the string `str`.
See also: split()

Arguments:
- [str] `str`: The original string.

Usage:
echo(str2vec("foo")); // ["f", "o", "o"] 
*/
function str2vec(str, v=[], i=0) =
	i == len(str) ? v :
	str2vec(str, concat(v, str[i]), i+1);

/**** substr ****

[str] substr(`str`, `[pos]`, `[len]`)
Returns a substring of a string.

Arguments:
- [str] `str`: The original string.
- [int] `pos` (optional): The substring position (0 by default).
- [int] `len` (optional): The substring length (string length by default).

Usage:
str = "OpenScad is a free CAD software.";
echo(substr(str, 12)); // "a free CAD software."
echo(substr(str, 12, 10)); // "a free CAD"
echo(substr(str, len=8)); // or substr(str, 0, 8); // "OpenScad"
*/
function substr(str, pos=0, len=-1, substr="") =
	len == 0 ? substr :
	len == -1 ? substr(str, pos, len(str)-pos, substr) :
	substr(str, pos+1, len-1, str(substr, str[pos]));
